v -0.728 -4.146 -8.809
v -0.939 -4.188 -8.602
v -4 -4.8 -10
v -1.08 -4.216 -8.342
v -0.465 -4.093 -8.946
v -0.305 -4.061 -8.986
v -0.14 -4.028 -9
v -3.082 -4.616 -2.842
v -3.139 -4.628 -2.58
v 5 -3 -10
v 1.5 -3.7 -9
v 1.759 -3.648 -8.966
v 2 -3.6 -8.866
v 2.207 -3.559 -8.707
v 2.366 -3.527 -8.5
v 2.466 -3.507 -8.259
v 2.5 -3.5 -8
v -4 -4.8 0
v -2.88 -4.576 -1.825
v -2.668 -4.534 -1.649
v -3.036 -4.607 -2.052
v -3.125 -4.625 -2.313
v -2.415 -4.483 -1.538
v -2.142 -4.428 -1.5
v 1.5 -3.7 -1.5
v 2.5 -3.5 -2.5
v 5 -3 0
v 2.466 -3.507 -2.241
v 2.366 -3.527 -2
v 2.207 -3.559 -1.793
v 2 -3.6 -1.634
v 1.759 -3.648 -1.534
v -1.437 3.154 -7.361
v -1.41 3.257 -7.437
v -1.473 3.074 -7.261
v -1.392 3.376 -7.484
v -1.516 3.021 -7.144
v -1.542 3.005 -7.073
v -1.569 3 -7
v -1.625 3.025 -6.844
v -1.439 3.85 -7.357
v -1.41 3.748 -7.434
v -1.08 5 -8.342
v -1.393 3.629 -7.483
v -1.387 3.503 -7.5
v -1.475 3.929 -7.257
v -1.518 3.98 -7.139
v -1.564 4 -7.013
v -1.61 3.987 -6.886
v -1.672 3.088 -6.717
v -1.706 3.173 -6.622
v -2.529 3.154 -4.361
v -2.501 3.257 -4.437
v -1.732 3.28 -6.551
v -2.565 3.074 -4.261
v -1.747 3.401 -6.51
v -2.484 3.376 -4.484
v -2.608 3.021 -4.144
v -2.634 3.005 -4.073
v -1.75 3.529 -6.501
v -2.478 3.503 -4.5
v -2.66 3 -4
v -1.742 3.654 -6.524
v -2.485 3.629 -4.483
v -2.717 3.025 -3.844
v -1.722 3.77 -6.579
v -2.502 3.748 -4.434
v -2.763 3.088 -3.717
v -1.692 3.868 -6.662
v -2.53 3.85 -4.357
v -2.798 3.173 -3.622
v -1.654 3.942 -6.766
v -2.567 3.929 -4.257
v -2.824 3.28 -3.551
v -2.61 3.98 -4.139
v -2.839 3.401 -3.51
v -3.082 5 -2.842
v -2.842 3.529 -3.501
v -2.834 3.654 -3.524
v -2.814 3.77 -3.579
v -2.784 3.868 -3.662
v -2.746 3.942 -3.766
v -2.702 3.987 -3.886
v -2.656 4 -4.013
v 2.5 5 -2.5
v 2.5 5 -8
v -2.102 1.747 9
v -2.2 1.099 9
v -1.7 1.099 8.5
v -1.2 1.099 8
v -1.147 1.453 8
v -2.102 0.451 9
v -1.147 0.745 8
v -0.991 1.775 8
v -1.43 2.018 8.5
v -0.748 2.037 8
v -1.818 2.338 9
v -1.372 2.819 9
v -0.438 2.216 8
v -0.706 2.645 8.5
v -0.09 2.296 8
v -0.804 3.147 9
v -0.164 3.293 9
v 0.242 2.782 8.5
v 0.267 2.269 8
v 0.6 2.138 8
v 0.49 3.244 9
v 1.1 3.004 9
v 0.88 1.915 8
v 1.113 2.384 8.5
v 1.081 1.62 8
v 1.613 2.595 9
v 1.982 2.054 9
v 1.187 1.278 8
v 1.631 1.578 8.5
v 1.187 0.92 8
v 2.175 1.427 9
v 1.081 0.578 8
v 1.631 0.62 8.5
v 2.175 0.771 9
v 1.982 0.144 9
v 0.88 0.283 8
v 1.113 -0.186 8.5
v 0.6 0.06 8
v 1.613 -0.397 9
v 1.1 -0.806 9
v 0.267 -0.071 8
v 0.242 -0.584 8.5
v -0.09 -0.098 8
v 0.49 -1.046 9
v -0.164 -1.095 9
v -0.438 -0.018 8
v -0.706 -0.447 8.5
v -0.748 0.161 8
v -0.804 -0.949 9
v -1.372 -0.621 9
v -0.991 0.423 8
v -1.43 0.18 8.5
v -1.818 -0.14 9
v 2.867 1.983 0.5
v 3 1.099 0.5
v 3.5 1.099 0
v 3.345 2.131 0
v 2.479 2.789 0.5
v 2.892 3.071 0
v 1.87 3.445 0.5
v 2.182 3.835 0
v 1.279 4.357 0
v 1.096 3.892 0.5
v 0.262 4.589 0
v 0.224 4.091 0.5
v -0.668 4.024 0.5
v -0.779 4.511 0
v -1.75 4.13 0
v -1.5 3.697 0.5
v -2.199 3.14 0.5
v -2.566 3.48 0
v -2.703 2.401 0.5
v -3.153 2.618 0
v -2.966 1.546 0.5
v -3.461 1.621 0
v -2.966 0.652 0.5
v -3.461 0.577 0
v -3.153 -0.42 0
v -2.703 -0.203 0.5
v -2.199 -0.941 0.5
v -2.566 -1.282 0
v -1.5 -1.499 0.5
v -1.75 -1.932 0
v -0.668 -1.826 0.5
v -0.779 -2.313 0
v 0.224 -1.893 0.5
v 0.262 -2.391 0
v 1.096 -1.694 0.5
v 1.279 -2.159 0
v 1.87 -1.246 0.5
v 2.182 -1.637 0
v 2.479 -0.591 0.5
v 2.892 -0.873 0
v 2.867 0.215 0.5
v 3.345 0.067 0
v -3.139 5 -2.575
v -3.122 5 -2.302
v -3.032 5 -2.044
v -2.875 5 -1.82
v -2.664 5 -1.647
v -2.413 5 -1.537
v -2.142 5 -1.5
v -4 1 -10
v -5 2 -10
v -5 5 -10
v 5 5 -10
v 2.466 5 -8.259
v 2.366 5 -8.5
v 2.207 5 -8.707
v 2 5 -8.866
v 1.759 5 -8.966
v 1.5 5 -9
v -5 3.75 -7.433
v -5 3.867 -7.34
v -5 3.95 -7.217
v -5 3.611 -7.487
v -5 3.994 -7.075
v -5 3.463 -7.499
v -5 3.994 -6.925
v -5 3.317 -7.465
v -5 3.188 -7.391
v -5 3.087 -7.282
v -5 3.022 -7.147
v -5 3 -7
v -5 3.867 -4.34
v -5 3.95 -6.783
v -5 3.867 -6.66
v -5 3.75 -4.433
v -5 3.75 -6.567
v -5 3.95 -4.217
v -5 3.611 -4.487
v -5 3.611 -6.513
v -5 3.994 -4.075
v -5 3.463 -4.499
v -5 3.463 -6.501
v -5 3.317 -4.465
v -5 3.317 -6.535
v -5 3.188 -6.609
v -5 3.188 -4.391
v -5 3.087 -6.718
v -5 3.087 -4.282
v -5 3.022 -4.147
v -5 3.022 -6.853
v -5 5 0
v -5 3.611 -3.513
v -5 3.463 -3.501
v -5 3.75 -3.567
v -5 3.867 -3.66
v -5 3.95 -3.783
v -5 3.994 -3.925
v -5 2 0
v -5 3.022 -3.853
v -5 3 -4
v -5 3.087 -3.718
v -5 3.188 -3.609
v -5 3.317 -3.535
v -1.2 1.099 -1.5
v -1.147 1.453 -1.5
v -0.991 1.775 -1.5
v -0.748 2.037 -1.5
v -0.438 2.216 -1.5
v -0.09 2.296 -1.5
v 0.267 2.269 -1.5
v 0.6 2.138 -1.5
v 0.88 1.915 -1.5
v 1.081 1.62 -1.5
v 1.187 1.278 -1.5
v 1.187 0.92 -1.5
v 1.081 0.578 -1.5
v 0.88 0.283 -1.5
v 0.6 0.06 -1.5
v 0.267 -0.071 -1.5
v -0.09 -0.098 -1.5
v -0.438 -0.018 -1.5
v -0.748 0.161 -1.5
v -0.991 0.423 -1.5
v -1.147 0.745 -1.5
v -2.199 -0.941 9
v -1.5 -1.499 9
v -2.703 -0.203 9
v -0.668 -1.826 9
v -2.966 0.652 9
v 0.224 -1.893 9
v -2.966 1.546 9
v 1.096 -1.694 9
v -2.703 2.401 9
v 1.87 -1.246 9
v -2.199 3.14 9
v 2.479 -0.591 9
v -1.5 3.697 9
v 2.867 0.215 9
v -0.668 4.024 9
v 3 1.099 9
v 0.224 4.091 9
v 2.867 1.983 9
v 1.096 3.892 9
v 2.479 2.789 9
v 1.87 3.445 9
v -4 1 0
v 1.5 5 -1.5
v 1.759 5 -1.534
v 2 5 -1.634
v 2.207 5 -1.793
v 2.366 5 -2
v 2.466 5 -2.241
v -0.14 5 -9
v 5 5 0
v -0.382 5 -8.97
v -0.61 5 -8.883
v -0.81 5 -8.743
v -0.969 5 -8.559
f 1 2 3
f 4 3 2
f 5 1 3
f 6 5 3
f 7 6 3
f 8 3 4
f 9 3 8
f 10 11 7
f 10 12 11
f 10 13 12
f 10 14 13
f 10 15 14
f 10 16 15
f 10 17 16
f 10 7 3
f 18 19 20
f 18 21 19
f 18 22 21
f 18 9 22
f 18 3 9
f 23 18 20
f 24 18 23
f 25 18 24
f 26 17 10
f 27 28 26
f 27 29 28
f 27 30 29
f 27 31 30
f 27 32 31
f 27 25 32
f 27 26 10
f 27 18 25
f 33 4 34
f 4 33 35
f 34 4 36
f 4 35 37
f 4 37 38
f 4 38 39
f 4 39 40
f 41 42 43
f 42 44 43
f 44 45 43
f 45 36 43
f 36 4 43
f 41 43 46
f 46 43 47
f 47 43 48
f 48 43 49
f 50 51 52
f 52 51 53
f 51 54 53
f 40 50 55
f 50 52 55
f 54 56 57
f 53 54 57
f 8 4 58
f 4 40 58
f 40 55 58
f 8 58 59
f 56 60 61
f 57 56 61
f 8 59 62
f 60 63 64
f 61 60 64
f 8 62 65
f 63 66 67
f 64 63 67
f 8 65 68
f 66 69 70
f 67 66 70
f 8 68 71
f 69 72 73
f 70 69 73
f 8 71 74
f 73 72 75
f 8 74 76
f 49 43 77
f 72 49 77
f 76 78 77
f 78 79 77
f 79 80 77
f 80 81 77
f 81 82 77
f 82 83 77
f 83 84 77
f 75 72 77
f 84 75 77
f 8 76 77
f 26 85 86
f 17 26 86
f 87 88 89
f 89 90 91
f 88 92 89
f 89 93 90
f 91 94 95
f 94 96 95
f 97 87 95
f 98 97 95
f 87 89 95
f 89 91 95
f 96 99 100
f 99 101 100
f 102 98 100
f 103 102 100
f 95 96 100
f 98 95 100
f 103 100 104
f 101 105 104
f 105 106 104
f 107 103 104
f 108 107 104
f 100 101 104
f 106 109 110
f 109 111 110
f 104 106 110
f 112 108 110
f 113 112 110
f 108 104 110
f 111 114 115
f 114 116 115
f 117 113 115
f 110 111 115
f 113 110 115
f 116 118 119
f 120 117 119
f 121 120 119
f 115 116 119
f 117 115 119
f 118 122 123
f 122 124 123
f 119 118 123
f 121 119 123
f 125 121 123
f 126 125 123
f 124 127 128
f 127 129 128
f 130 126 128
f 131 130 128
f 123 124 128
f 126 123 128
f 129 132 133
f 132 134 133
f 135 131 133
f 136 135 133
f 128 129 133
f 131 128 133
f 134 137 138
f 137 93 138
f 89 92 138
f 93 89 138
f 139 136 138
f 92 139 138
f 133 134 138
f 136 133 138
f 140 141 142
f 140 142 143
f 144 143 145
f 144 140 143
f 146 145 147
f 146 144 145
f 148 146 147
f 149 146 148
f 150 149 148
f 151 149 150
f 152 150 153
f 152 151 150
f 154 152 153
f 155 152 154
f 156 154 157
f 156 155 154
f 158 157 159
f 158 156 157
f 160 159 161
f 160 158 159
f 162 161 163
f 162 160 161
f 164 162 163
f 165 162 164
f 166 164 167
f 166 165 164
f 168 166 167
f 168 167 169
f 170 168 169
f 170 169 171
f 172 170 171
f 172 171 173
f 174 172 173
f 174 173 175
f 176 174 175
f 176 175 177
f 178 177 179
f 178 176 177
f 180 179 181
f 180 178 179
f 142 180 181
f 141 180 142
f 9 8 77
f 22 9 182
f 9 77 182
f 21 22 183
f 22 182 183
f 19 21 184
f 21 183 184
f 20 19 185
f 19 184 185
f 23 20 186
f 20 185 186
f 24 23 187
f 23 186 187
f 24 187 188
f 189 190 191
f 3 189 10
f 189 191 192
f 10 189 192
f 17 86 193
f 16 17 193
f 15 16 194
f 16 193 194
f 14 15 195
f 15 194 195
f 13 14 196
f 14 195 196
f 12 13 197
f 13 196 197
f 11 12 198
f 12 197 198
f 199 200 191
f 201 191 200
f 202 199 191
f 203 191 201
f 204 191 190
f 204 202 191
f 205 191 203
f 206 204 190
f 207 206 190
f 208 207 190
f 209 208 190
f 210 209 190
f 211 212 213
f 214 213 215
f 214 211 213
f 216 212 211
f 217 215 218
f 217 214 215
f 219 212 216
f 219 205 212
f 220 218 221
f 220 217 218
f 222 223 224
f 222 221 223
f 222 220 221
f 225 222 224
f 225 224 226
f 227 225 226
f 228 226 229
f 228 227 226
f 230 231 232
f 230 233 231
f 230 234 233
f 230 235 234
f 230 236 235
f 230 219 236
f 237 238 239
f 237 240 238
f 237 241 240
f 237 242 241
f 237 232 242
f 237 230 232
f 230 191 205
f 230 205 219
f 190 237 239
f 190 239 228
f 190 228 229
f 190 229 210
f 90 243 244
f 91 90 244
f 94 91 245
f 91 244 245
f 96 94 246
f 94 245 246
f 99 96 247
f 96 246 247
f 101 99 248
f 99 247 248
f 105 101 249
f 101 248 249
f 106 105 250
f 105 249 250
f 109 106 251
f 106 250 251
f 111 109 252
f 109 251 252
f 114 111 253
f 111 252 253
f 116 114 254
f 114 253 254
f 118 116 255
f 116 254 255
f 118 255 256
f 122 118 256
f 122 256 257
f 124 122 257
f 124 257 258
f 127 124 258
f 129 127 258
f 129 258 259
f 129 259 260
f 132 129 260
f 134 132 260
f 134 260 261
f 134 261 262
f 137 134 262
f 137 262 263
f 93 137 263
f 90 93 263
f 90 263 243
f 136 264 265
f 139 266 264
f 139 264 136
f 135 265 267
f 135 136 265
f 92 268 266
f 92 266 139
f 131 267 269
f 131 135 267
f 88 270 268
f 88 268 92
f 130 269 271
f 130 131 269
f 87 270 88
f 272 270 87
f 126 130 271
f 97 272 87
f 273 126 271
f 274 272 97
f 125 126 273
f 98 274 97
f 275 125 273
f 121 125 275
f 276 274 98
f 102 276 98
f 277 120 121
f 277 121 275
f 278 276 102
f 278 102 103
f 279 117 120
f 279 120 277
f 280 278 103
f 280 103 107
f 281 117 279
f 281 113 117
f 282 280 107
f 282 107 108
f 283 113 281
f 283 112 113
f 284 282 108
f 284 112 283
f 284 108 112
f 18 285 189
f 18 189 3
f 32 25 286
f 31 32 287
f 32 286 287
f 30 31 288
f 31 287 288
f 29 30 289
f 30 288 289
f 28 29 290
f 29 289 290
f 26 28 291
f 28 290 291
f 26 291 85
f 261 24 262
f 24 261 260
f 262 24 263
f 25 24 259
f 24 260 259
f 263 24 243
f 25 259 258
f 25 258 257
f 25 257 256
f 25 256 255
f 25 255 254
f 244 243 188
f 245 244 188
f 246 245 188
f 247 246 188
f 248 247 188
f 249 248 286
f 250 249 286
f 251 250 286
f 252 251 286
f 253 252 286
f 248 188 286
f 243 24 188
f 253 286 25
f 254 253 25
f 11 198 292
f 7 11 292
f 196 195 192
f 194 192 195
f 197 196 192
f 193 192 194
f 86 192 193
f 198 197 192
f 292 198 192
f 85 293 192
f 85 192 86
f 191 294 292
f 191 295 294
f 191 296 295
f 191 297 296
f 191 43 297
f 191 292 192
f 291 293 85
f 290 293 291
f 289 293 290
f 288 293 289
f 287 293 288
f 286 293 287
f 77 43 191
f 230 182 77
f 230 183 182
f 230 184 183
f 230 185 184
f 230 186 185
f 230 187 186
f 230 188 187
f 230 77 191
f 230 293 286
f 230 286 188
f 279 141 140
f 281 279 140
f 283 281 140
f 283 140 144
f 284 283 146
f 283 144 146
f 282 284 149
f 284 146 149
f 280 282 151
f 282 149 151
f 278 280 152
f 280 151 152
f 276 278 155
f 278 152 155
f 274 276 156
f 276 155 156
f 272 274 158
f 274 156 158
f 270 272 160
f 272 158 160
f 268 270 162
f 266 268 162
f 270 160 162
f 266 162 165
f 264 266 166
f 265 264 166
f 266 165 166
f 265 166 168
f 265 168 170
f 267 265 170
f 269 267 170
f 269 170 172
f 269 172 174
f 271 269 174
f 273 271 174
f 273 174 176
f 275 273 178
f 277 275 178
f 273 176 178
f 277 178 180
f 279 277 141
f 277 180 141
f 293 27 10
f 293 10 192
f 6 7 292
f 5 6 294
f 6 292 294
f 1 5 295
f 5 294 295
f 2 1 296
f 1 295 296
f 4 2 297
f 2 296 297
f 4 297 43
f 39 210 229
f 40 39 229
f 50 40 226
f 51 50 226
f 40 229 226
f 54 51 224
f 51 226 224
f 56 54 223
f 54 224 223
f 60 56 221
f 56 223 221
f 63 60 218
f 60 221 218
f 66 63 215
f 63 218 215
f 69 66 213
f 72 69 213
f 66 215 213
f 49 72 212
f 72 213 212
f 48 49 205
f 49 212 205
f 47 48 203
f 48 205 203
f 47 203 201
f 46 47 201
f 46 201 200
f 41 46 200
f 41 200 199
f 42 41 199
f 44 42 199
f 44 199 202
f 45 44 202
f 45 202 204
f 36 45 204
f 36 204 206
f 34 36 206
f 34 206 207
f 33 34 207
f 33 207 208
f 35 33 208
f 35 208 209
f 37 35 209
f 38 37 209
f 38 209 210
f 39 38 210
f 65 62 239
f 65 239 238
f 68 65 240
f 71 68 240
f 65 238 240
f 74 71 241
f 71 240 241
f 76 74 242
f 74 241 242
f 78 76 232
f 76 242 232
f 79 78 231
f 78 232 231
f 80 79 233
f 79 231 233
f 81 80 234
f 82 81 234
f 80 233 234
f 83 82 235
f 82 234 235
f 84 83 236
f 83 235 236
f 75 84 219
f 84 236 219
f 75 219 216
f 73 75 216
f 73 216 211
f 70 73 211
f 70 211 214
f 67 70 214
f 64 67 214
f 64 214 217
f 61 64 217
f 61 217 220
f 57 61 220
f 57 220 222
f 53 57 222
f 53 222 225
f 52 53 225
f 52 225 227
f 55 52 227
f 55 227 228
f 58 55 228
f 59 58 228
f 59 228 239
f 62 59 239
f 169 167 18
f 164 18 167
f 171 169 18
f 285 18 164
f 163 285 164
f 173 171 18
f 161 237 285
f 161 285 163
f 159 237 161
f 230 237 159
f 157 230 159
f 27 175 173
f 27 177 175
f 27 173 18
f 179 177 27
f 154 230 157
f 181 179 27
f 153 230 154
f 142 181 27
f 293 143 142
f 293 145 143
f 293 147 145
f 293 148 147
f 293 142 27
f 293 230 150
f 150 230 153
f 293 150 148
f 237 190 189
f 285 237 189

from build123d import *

# Parameters (mm, degrees)
SKETCH1_R                                       = 3
BOSS_EXTRUDE1_DEPTH                             = 10
SKETCH1_3_R                                     = 3
BOSS_EXTRUDE2_DEPTH                             = 9
CUT_EXTRUDE1_DEPTH                              = 10
SKETCH2_R                                       = 0.5
CUT_EXTRUDE2_DEPTH                              = 5
CHAMFER1_SIZE                                   = 0.5
CSK_FOR_M2_FLAT_HEAD_MACHINE_SCREW1_D           = 2.4
CSK_FOR_M2_FLAT_HEAD_MACHINE_SCREW1_DEPTH       = 10.5
CSK_FOR_M2_FLAT_HEAD_MACHINE_SCREW1_CSINK_D     = 4.4
CSK_FOR_M2_FLAT_HEAD_MACHINE_SCREW1_CSINK_ANGLE = 90


with BuildPart() as part:
    # Sketch1 → Boss-Extrude1 (new body)
    # profile 1 of 3: a face of its own
    with BuildSketch(Plane.XY):
        Polygon((-4, 1), (-4, -4.8), (5, -3), (5, 5), (-4, 5), align=None)
        with Locations((0, 1.099019514)):
            Circle(SKETCH1_R, mode=Mode.SUBTRACT)
    # profile 2 of 3: a face of its own
    with BuildSketch(Plane.XY):
        Polygon((-5, 2), (-4, 1), (-4, 5), (-5, 5), align=None)
    # profile 3 of 3: a face of its own
    with BuildSketch(Plane.XY):
        with Locations((0, 1.099019514)):
            Circle(SKETCH1_R)
    extrude(amount=-BOSS_EXTRUDE1_DEPTH)

    # Sketch1<3> → Boss-Extrude2 (add)
    with BuildSketch(Plane.XY):
        with Locations((0, 1.099019514)):
            Circle(SKETCH1_3_R)
    extrude(amount=BOSS_EXTRUDE2_DEPTH)

    # Sketch5 → Cut-Extrude1 (cut)
    with BuildSketch(Plane(origin=(0, 5, 0), x_dir=(1, 0, 0), z_dir=(0, 1, 0))):
        with BuildLine():
            Line((1.5, 9), (-0.140385722, 9))
            ThreePointArc((-0.140385722, 9), (-0.713962158, 8.819152044), (-1.080078342, 8.342020143))
            Line((-1.080078342, 8.342020143), (-3.081914631, 2.842020143))
            ThreePointArc((-3.081914631, 2.842020143), (-2.961374054, 1.926423564), (-2.14222201, 1.5))
            Line((-2.14222201, 1.5), (0, 1.5))
            Line((0, 1.5), (1.5, 1.5))
            ThreePointArc((1.5, 1.5), (2.207106781, 1.792893219), (2.5, 2.5))
            Line((2.5, 2.5), (2.5, 4))
            Line((2.5, 4), (2.5, 8))
            ThreePointArc((2.5, 8), (2.207106781, 8.707106781), (1.5, 9))
        make_face()
    extrude(amount=-CUT_EXTRUDE1_DEPTH, mode=Mode.SUBTRACT)

    # Sketch2 → Cut-Extrude2 (cut)
    with BuildSketch(Plane.ZY.offset(5)):
        with Locations(Location((-7, 3.5, 0), (0, 0, 270))):
            Circle(SKETCH2_R)
        with Locations(Location((-4, 3.5, 0), (0, 0, 270))):
            Circle(SKETCH2_R)
    extrude(amount=-CUT_EXTRUDE2_DEPTH, mode=Mode.SUBTRACT)

    # Chamfer1
    chamfer1_edges = [part.edges().sort_by_distance(p)[0] for p in [
        (-3, 1.099019514, 0),
    ]]
    chamfer(chamfer1_edges, length=CHAMFER1_SIZE)

    # CSK for M2 Flat Head Machine Screw1
    with Locations(Plane.XY.offset(9)):
        with Locations((0, 1.099019514)):
            CounterSinkHole(CSK_FOR_M2_FLAT_HEAD_MACHINE_SCREW1_D / 2, CSK_FOR_M2_FLAT_HEAD_MACHINE_SCREW1_CSINK_D / 2, depth=CSK_FOR_M2_FLAT_HEAD_MACHINE_SCREW1_DEPTH, counter_sink_angle=CSK_FOR_M2_FLAT_HEAD_MACHINE_SCREW1_CSINK_ANGLE)


solid = part.part
